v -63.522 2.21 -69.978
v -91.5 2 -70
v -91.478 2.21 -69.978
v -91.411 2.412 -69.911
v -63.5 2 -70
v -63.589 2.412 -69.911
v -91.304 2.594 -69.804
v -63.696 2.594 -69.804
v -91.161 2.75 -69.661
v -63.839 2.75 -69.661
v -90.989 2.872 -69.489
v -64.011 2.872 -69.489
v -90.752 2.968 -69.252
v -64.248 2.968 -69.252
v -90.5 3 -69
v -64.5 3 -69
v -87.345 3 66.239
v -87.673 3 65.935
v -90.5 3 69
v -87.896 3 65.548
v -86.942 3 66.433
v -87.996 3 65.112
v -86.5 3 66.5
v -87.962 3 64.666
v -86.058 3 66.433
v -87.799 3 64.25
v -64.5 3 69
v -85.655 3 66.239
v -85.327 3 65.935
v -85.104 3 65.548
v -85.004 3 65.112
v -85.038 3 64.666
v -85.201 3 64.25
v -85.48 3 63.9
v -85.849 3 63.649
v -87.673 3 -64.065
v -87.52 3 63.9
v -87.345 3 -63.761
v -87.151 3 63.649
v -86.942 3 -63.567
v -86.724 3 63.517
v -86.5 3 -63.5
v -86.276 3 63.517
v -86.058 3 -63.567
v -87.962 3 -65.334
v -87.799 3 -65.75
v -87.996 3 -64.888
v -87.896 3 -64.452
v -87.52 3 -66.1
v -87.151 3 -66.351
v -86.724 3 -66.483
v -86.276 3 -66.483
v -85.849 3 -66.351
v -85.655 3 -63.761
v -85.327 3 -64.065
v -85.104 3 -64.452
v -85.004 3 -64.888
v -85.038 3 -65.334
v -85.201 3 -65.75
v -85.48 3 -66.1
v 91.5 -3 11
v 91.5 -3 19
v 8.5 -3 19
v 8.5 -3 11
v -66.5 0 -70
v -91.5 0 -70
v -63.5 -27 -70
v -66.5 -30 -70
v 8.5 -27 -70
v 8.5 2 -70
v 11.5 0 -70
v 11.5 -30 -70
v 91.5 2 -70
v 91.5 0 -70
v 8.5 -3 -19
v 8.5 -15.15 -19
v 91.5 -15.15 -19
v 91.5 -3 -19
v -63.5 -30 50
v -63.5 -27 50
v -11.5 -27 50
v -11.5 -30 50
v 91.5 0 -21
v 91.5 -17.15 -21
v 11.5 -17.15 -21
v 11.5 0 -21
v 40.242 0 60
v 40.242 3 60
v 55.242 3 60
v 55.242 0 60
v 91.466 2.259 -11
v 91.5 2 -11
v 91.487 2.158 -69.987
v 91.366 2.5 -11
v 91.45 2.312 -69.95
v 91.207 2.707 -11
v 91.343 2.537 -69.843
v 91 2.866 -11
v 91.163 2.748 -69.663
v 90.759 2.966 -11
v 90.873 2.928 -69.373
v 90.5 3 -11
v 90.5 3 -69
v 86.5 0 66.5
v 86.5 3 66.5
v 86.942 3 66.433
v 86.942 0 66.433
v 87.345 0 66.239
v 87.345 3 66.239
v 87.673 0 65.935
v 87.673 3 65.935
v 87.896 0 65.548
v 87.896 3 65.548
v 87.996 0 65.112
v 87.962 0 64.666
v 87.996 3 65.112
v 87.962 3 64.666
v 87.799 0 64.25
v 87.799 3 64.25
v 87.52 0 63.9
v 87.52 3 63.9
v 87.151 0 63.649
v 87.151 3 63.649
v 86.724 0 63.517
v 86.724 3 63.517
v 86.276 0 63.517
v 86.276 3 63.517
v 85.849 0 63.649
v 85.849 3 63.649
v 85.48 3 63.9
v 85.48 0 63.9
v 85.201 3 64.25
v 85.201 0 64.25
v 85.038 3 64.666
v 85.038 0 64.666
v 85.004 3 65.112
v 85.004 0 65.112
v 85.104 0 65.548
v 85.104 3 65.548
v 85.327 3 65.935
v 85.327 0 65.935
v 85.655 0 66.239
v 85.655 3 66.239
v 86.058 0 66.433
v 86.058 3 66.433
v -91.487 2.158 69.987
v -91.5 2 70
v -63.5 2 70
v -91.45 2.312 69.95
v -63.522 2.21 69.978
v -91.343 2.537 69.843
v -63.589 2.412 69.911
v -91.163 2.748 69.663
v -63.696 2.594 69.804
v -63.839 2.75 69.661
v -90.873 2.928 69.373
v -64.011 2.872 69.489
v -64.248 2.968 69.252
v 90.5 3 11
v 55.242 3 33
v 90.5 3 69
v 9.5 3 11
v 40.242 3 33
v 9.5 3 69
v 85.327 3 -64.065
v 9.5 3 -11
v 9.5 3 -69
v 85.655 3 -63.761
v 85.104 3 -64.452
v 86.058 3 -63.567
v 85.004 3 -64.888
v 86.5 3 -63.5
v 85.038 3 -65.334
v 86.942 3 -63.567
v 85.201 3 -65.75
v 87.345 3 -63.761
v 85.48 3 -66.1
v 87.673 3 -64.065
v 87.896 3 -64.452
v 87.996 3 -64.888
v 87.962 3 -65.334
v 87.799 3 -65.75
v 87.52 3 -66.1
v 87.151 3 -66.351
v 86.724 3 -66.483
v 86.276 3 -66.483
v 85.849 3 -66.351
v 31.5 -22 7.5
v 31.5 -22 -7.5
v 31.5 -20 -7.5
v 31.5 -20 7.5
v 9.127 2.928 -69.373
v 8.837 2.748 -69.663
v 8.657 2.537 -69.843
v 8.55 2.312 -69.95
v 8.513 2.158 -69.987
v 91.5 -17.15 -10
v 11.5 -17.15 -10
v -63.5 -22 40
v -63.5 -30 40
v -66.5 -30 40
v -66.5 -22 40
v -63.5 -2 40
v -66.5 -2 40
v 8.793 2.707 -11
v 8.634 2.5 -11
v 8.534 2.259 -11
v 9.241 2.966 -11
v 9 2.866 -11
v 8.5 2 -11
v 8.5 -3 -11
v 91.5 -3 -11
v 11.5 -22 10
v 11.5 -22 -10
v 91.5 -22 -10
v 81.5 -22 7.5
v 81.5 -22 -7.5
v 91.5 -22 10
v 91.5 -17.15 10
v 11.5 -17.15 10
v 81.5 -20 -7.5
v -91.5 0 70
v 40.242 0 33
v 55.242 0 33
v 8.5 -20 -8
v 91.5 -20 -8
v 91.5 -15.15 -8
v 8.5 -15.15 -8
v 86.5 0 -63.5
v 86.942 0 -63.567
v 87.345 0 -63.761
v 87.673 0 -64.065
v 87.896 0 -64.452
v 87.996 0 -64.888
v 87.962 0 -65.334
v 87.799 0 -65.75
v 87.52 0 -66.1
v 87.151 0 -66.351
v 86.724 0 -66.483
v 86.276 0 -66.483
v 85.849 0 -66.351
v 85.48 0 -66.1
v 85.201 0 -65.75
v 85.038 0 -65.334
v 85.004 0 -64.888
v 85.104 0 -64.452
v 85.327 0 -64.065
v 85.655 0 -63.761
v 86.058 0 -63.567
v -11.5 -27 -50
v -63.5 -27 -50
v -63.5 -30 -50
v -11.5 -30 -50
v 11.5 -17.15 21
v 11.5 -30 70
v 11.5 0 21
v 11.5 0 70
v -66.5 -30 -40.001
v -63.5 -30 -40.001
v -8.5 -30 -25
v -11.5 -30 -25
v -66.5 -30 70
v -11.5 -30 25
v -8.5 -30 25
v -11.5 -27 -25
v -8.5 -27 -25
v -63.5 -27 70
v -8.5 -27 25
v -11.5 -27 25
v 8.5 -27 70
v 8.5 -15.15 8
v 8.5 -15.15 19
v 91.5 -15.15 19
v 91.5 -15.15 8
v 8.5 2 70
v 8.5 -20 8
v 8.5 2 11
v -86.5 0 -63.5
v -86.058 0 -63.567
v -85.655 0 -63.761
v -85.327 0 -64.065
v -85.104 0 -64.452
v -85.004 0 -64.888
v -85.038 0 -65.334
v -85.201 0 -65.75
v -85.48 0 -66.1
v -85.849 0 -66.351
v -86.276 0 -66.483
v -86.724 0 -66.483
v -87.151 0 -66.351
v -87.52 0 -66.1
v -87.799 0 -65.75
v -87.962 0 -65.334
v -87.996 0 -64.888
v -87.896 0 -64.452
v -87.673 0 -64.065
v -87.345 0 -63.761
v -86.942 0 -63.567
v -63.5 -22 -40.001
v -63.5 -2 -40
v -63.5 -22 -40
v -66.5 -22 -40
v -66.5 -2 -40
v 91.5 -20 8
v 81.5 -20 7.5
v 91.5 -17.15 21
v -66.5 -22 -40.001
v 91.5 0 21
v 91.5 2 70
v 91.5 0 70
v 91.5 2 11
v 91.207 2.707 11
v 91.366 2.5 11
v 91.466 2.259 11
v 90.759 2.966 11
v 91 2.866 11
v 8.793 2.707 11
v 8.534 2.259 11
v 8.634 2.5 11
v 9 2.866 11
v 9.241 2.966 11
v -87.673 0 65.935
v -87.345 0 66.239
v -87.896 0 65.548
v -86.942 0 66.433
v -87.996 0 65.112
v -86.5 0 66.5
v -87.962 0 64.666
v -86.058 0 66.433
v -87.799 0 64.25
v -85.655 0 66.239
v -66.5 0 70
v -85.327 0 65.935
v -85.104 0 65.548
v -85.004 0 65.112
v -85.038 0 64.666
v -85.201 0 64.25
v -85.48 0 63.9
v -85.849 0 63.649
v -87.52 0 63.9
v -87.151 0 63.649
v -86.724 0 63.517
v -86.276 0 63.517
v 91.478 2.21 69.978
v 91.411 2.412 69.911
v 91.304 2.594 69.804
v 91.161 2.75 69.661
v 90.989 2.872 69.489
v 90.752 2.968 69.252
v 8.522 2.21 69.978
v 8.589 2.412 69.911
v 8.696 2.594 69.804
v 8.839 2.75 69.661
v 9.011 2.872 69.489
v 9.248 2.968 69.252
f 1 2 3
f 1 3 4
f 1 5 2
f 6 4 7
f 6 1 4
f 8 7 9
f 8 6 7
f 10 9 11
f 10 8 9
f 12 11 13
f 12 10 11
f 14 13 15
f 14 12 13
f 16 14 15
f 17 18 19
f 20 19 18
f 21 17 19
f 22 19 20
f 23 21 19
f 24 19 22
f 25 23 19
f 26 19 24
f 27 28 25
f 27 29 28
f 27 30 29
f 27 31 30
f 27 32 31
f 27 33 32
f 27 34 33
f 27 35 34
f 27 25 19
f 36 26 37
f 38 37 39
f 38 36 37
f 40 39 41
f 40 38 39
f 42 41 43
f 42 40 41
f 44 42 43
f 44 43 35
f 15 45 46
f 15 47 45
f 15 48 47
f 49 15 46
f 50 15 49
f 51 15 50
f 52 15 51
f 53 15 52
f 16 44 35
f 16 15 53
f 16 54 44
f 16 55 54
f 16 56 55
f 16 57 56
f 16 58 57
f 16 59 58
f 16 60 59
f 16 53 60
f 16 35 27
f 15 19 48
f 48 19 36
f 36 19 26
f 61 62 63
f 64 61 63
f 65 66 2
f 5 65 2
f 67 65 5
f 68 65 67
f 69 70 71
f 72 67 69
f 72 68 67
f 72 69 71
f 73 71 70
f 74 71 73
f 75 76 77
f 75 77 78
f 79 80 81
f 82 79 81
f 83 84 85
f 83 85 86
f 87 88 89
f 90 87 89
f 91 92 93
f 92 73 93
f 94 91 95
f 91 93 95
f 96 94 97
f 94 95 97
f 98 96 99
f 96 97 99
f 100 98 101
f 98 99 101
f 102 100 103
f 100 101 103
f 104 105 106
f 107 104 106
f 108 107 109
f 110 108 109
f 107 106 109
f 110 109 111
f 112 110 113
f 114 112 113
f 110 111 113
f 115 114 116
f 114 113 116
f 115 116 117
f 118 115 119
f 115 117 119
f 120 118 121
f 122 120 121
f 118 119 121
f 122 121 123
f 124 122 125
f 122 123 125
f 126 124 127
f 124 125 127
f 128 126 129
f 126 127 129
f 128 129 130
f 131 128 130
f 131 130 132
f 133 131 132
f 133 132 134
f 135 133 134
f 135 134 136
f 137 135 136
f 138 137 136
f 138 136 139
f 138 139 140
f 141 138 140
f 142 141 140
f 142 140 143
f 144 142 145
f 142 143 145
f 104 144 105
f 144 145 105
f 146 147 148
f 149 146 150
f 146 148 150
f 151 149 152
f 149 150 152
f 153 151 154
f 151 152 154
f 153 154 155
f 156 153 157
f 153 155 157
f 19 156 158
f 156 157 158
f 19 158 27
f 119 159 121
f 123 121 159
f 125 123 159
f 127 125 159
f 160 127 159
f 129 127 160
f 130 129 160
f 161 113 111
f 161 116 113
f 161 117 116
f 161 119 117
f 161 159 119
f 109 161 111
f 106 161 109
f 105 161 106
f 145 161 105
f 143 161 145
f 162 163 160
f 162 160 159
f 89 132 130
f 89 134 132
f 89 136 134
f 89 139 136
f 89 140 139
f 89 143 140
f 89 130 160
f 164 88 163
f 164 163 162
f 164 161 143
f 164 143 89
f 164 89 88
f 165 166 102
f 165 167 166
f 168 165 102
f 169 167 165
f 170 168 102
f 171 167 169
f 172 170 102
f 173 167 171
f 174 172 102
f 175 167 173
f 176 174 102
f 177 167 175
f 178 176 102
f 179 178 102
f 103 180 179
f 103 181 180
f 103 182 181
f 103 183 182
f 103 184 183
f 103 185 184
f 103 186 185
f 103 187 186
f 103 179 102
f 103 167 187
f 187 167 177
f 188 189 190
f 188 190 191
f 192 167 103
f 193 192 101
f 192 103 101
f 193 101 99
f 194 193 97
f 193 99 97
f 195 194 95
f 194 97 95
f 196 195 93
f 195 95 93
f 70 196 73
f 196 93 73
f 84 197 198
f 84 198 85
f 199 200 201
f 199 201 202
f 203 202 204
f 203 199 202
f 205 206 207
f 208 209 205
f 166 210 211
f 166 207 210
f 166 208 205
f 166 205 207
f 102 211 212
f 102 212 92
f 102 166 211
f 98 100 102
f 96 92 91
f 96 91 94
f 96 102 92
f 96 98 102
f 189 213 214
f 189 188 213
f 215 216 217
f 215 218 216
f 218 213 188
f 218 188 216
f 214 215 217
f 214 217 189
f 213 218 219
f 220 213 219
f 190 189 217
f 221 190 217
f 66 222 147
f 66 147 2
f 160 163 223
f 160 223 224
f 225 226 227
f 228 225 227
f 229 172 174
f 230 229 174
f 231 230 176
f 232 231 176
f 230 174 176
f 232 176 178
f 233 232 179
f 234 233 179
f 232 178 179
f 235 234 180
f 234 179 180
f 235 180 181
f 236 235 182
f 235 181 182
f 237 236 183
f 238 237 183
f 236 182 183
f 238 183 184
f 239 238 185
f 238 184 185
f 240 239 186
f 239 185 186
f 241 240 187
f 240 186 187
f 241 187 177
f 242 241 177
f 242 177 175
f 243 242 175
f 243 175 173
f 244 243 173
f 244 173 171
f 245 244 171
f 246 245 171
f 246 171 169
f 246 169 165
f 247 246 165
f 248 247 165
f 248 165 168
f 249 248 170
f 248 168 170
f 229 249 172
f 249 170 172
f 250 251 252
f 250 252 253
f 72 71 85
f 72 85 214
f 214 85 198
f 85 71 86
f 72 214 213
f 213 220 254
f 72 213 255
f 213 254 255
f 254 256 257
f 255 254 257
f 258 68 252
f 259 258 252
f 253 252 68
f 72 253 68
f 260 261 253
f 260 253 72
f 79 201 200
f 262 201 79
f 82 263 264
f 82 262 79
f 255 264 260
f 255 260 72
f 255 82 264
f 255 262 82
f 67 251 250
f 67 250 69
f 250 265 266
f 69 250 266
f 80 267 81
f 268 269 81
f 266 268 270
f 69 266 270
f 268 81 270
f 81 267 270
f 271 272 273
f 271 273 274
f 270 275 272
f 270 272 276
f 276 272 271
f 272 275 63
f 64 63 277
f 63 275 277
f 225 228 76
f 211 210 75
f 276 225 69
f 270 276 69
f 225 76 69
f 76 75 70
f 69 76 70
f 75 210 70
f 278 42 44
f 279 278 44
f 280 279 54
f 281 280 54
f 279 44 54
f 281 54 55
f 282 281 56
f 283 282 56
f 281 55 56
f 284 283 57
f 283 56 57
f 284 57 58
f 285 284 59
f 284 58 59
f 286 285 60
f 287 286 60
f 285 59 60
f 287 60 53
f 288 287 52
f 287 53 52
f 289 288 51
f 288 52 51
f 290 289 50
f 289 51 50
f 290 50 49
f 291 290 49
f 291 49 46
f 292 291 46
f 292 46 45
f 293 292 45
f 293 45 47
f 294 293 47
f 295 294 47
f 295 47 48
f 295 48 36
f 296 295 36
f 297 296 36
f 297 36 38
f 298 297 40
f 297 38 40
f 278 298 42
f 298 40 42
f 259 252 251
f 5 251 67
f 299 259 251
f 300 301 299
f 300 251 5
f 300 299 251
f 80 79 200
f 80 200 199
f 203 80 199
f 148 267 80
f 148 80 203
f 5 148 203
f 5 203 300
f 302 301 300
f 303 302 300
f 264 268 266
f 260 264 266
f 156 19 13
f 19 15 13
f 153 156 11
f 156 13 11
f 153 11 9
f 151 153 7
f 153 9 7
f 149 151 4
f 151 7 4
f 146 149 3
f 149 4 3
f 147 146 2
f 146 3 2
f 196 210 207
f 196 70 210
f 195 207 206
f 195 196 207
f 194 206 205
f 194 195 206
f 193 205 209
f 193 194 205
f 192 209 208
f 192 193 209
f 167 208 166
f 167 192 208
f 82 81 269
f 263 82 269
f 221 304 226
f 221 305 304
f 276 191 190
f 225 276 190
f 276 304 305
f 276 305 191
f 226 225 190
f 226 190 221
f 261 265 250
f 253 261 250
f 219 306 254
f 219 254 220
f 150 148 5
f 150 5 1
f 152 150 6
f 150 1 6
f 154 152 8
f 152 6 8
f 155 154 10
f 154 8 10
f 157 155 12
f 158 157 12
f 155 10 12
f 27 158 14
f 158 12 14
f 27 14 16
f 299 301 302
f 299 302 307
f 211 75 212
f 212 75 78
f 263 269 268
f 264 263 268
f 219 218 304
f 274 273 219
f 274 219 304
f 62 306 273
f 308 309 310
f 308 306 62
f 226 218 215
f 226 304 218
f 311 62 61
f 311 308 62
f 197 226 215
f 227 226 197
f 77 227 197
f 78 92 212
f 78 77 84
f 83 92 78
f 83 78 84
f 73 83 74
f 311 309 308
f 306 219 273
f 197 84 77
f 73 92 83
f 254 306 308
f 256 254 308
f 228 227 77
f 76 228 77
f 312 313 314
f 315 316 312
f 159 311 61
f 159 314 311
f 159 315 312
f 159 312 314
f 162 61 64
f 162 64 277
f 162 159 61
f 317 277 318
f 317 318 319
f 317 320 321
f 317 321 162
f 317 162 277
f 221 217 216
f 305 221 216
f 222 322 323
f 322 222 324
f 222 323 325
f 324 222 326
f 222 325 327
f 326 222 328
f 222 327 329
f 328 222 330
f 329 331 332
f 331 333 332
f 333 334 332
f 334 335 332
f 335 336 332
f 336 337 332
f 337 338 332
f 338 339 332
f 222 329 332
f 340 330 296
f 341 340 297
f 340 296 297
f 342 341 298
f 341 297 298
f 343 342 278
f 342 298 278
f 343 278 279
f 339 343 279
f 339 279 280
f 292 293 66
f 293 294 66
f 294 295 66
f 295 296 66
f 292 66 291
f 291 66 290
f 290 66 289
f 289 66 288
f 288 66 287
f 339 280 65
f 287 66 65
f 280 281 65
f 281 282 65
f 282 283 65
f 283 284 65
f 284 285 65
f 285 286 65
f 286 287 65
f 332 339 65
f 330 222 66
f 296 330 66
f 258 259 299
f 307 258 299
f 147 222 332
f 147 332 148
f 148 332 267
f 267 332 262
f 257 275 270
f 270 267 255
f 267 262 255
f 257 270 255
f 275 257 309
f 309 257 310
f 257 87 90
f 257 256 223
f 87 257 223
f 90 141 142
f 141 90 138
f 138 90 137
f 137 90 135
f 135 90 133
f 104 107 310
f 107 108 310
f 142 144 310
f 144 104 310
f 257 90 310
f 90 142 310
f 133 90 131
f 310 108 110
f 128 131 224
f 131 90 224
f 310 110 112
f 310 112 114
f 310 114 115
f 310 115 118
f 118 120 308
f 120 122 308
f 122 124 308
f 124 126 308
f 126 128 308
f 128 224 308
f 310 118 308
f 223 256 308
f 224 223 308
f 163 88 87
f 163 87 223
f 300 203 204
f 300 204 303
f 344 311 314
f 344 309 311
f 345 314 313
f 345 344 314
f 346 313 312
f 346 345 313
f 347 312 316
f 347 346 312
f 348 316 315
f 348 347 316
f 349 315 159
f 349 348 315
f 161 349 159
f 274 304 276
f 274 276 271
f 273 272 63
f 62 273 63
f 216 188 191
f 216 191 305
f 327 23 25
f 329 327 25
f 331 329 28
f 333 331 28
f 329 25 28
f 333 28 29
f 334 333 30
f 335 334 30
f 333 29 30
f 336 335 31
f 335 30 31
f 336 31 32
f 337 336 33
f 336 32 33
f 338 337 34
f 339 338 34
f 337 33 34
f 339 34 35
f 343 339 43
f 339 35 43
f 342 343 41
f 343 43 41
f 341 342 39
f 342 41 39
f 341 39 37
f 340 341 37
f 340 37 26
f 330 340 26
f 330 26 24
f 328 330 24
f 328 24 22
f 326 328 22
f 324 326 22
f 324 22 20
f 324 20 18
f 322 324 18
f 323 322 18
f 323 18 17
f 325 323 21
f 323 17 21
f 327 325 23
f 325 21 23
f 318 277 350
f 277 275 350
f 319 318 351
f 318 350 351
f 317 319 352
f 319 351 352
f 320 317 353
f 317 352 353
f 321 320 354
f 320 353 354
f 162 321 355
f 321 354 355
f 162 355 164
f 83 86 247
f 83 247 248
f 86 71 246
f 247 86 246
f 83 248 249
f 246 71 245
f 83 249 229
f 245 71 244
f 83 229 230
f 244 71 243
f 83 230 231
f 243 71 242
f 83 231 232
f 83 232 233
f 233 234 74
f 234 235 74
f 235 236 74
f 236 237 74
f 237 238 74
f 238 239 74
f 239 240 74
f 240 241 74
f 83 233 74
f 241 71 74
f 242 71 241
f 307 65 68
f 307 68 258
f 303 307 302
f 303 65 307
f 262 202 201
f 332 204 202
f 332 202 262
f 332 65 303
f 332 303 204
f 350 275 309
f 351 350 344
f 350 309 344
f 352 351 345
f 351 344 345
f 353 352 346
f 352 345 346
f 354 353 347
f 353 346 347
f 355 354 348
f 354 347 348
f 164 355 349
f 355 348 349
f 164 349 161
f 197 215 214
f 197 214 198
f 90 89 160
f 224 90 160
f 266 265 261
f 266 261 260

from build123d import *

# Parameters (mm, degrees)
SKETCH1_W               = 183
SKETCH1_H               = 140
BOSS_EXTRUDE1_DEPTH     = 3
SKETCH2_W               = 78
SKETCH2_H               = 140
BOSS_EXTRUDE2_DEPTH     = 30
SKETCH3_W               = 72
SKETCH3_H               = 30
CUT_EXTRUDE1_DEPTH      = 140
SKETCH5_W               = 80
SKETCH5_H               = 70
BOSS_EXTRUDE3_DEPTH     = 25
CUT_EXTRUDE2_DEPTH      = 199.214530244
CUT_EXTRUDE2_DEPTH_BACK = 85
SKETCH7_W               = 20
SKETCH7_H               = 30
CUT_EXTRUDE3_DEPTH      = 85
SKETCH8_W               = 60
SKETCH8_H               = 20
CUT_EXTRUDE4_DEPTH      = 85
SKETCH9_W               = 50
SKETCH9_H               = 15
CUT_EXTRUDE5_DEPTH      = 10
SKETCH11_W              = 20
SKETCH11_H              = 20
CUT_EXTRUDE6_DEPTH      = 10
SKETCH12_W              = 20
SKETCH12_H              = 20
CUT_EXTRUDE7_DEPTH      = 10
SKETCH15_W              = 42
SKETCH15_H              = 100
CUT_EXTRUDE8_DEPTH      = 10
SKETCH16_W              = 13.088467217
SKETCH16_H              = 23
BOSS_EXTRUDE4_DEPTH     = 83
SKETCH17_W              = 13.301151585
SKETCH17_H              = 23.738473688
BOSS_EXTRUDE5_DEPTH     = 83
SKETCH18_W              = 83
SKETCH18_H              = 6
BOSS_EXTRUDE6_DEPTH     = 8
SKETCH19_W              = 83
SKETCH19_H              = 6
BOSS_EXTRUDE7_DEPTH     = 8
SKETCH20_W              = 14
SKETCH20_H              = 25
CUT_EXTRUDE9_DEPTH      = 80
SKETCH21_W              = 14
SKETCH21_H              = 25
CUT_EXTRUDE10_DEPTH     = 80
SKETCH22_W              = 42
SKETCH22_H              = 3
CUT_EXTRUDE11_DEPTH     = 80
SKETCH23_W              = 10
SKETCH23_H              = 100
CUT_EXTRUDE12_DEPTH     = 3
SKETCH24_W              = 80.000727439
SKETCH24_H              = 8
CUT_EXTRUDE13_DEPTH     = 3
SKETCH25_W              = 11
SKETCH25_H              = 4.85
BOSS_EXTRUDE9_DEPTH     = 83
SKETCH26_W              = 11
SKETCH26_H              = 4.85
BOSS_EXTRUDE10_DEPTH    = 83
SKETCH27_W              = 11
SKETCH27_H              = 4.85
CUT_EXTRUDE14_DEPTH     = 80
SKETCH28_W              = 11
SKETCH28_H              = 4.85
CUT_EXTRUDE15_DEPTH     = 80
SKETCH29_W              = 15
SKETCH29_H              = 27
CUT_EXTRUDE16_DEPTH     = 12
FILLET2_R               = 1
SKETCH30_R              = 1.5
CUT_EXTRUDE17_DEPTH     = 3
SKETCH31_R              = 1.5
CUT_EXTRUDE18_DEPTH     = 3
SKETCH32_R              = 1.5
CUT_EXTRUDE19_DEPTH     = 3
SKETCH33_R              = 1.5
CUT_EXTRUDE20_DEPTH     = 3


with BuildPart() as part:
    # Sketch1 → Boss-Extrude1 (new body)
    with BuildSketch(Plane(origin=(0, 0, 0), x_dir=(1, 0, 0), z_dir=(0, 1, 0))):
        Rectangle(SKETCH1_W, SKETCH1_H)
    extrude(amount=BOSS_EXTRUDE1_DEPTH)

    # Sketch2 → Boss-Extrude2 (add)
    with BuildSketch(Plane.XZ):
        with Locations((-27.5, 0)):
            Rectangle(SKETCH2_W, SKETCH2_H)
    extrude(amount=BOSS_EXTRUDE2_DEPTH)

    # Sketch3 → Cut-Extrude1 (cut)
    with BuildSketch(Plane.XY.offset(70)):
        with Locations((-27.5, -12)):
            Rectangle(SKETCH3_W, SKETCH3_H)
    extrude(amount=-CUT_EXTRUDE1_DEPTH, mode=Mode.SUBTRACT)

    # Sketch5 → Boss-Extrude3 (add)
    with BuildSketch(Plane.XZ):
        with Locations((51.5, 0)):
            Rectangle(SKETCH5_W, SKETCH5_H)
    extrude(amount=BOSS_EXTRUDE3_DEPTH)

    # Sketch6 → Cut-Extrude2 (cut, two sides: drawn at the far end of the back side and taken through both)
    with BuildSketch(Plane(origin=(91.5, 0, 0), x_dir=(0, 0, -1), z_dir=(1, 0, 0)).offset(-CUT_EXTRUDE2_DEPTH_BACK)):
        Polygon((-20, 204.718543704), (-20, 3), (-20, -4.67262363), (-30, -4.67262363), (-30, -20), (30, -20), (30, -4.67262363), (20, -4.67262363), (20, 3), (20, 204.718543704), (20, 608.155631112), (-20, 608.155631112), align=None)
    extrude(amount=CUT_EXTRUDE2_DEPTH + CUT_EXTRUDE2_DEPTH_BACK, mode=Mode.SUBTRACT)

    # Sketch7 → Cut-Extrude3 (cut)
    with BuildSketch(Plane(origin=(0, -27, 0), x_dir=(1, 0, 0), z_dir=(0, 1, 0))):
        with Locations((-18.5, 10)):
            Rectangle(SKETCH7_W, SKETCH7_H)
    extrude(amount=-CUT_EXTRUDE3_DEPTH, mode=Mode.SUBTRACT)

    # Sketch8 → Cut-Extrude4 (cut)
    with BuildSketch(Plane(origin=(-63.5, 0, 0), x_dir=(0, 0, -1), z_dir=(1, 0, 0))):
        with Locations((10, -12)):
            Rectangle(SKETCH8_W, SKETCH8_H)
    extrude(amount=-CUT_EXTRUDE4_DEPTH, mode=Mode.SUBTRACT)

    # Sketch9 → Cut-Extrude5 (cut)
    with BuildSketch(Plane.XZ.offset(25)):
        with Locations((56.5, 0)):
            Rectangle(SKETCH9_W, SKETCH9_H)
    extrude(amount=-CUT_EXTRUDE5_DEPTH, mode=Mode.SUBTRACT)

    # Sketch11 → Cut-Extrude6 (cut)
    with BuildSketch(Plane(origin=(-63.5, 0, 0), x_dir=(0, 0, -1), z_dir=(1, 0, 0))):
        with Locations((-30, -12)):
            Rectangle(SKETCH11_W, SKETCH11_H)
    extrude(amount=-CUT_EXTRUDE6_DEPTH, mode=Mode.SUBTRACT)

    # Sketch12 → Cut-Extrude7 (cut)
    with BuildSketch(Plane(origin=(0, -27, 0), x_dir=(1, 0, 0), z_dir=(0, 1, 0))):
        with Locations((-18.5, -15)):
            Rectangle(SKETCH12_W, SKETCH12_H)
    extrude(amount=-CUT_EXTRUDE7_DEPTH, mode=Mode.SUBTRACT)

    # Sketch15 → Cut-Extrude8 (cut)
    with BuildSketch(Plane(origin=(0, -27, 0), x_dir=(1, 0, 0), z_dir=(0, 1, 0))):
        with Locations((-32.5, 0)):
            Rectangle(SKETCH15_W, SKETCH15_H)
    extrude(amount=-CUT_EXTRUDE8_DEPTH, mode=Mode.SUBTRACT)

    # Sketch16 → Boss-Extrude4 (add)
    with BuildSketch(Plane(origin=(91.5, 0, 0), x_dir=(0, 0, -1), z_dir=(1, 0, 0))):
        with Locations((-25.544233609, -8.5)):
            Rectangle(SKETCH16_W, SKETCH16_H)
    extrude(amount=-BOSS_EXTRUDE4_DEPTH)

    # Sketch17 → Boss-Extrude5 (add)
    with BuildSketch(Plane(origin=(91.5, 0, 0), x_dir=(0, 0, -1), z_dir=(1, 0, 0))):
        with Locations((25.650575792, -8.869236844)):
            Rectangle(SKETCH17_W, SKETCH17_H)
    extrude(amount=-BOSS_EXTRUDE5_DEPTH)

    # Sketch18 → Boss-Extrude6 (add)
    with BuildSketch(Plane(origin=(0, 0, 19), x_dir=(-1, 0, 0), z_dir=(0, 0, -1))):
        with Locations((-50, 0)):
            Rectangle(SKETCH18_W, SKETCH18_H)
    extrude(amount=BOSS_EXTRUDE6_DEPTH)

    # Sketch19 → Boss-Extrude7 (add)
    with BuildSketch(Plane.XY.offset(-19)):
        with Locations((50, 0)):
            Rectangle(SKETCH19_W, SKETCH19_H)
    extrude(amount=BOSS_EXTRUDE7_DEPTH)

    # Sketch20 → Cut-Extrude9 (cut)
    with BuildSketch(Plane(origin=(91.5, 0, 0), x_dir=(0, 0, -1), z_dir=(1, 0, 0))):
        with Locations((-28, -12.5)):
            Rectangle(SKETCH20_W, SKETCH20_H)
    extrude(amount=-CUT_EXTRUDE9_DEPTH, mode=Mode.SUBTRACT)

    # Sketch21 → Cut-Extrude10 (cut)
    with BuildSketch(Plane(origin=(91.5, 0, 0), x_dir=(0, 0, -1), z_dir=(1, 0, 0))):
        with Locations((28, -12.5)):
            Rectangle(SKETCH21_W, SKETCH21_H)
    extrude(amount=-CUT_EXTRUDE10_DEPTH, mode=Mode.SUBTRACT)

    # Sketch22 → Cut-Extrude11 (cut)
    with BuildSketch(Plane(origin=(91.5, 0, 0), x_dir=(0, 0, -1), z_dir=(1, 0, 0))):
        with Locations((0, -23.5)):
            Rectangle(SKETCH22_W, SKETCH22_H)
    extrude(amount=-CUT_EXTRUDE11_DEPTH, mode=Mode.SUBTRACT)

    # Sketch23 → Cut-Extrude12 (cut)
    with BuildSketch(Plane(origin=(0, -27, 0), x_dir=(1, 0, 0), z_dir=(0, 1, 0))):
        with Locations((-58.5, 0)):
            Rectangle(SKETCH23_W, SKETCH23_H)
    extrude(amount=-CUT_EXTRUDE12_DEPTH, mode=Mode.SUBTRACT)

    # Sketch24 → Cut-Extrude13 (cut)
    with BuildSketch(Plane(origin=(-63.5, 0, 0), x_dir=(0, 0, -1), z_dir=(1, 0, 0))):
        with Locations((0.00036372, -26)):
            Rectangle(SKETCH24_W, SKETCH24_H)
    extrude(amount=-CUT_EXTRUDE13_DEPTH, mode=Mode.SUBTRACT)

    # Sketch25 → Boss-Extrude9 (add)
    with BuildSketch(Plane(origin=(91.5, 0, 0), x_dir=(0, 0, -1), z_dir=(1, 0, 0))):
        with Locations((-13.5, -17.575)):
            Rectangle(SKETCH25_W, SKETCH25_H)
    extrude(amount=-BOSS_EXTRUDE9_DEPTH)

    # Sketch26 → Boss-Extrude10 (add)
    with BuildSketch(Plane(origin=(91.5, 0, 0), x_dir=(0, 0, -1), z_dir=(1, 0, 0))):
        with Locations((13.5, -17.575)):
            Rectangle(SKETCH26_W, SKETCH26_H)
    extrude(amount=-BOSS_EXTRUDE10_DEPTH)

    # Sketch27 → Cut-Extrude14 (cut)
    with BuildSketch(Plane(origin=(91.5, 0, 0), x_dir=(0, 0, -1), z_dir=(1, 0, 0))):
        with Locations((-15.5, -19.575)):
            Rectangle(SKETCH27_W, SKETCH27_H)
    extrude(amount=-CUT_EXTRUDE14_DEPTH, mode=Mode.SUBTRACT)

    # Sketch28 → Cut-Extrude15 (cut)
    with BuildSketch(Plane(origin=(91.5, 0, 0), x_dir=(0, 0, -1), z_dir=(1, 0, 0))):
        with Locations((15.5, -19.575)):
            Rectangle(SKETCH28_W, SKETCH28_H)
    extrude(amount=-CUT_EXTRUDE15_DEPTH, mode=Mode.SUBTRACT)

    # Sketch29 → Cut-Extrude16 (cut)
    with BuildSketch(Plane(origin=(0, 3, 0), x_dir=(1, 0, 0), z_dir=(0, 1, 0))):
        with Locations((47.741795072, -46.5)):
            Rectangle(SKETCH29_W, SKETCH29_H)
    extrude(amount=-CUT_EXTRUDE16_DEPTH, mode=Mode.SUBTRACT)

    # Fillet2
    fillet2_edges = [part.edges().sort_by_distance(p)[0] for p in [
        (91.5, 3, 40.5),
        (50, 3, -70),
        (50, 3, 70),
        (-77.5, 3, -70),
        (-63.5, 3, 0),
        (8.5, 3, -40.5),
        (-91.5, 3, 0),
        (8.5, 3, 40.5),
        (91.5, 3, -40.5),
        (-77.5, 3, 70),
    ]]
    fillet(fillet2_edges, radius=FILLET2_R)

    # Sketch30 → Cut-Extrude17 (cut)
    with BuildSketch(Plane(origin=(0, 3, 0), x_dir=(1, 0, 0), z_dir=(0, 1, 0))):
        with Locations(Location((-86.5, -65, 0), (0, 0, 270))):
            Circle(SKETCH30_R)
    extrude(amount=-CUT_EXTRUDE17_DEPTH, mode=Mode.SUBTRACT)

    # Sketch31 → Cut-Extrude18 (cut)
    with BuildSketch(Plane(origin=(0, 3, 0), x_dir=(1, 0, 0), z_dir=(0, 1, 0))):
        with Locations(Location((-86.5, 65, 0), (0, 0, 270))):
            Circle(SKETCH31_R)
    extrude(amount=-CUT_EXTRUDE18_DEPTH, mode=Mode.SUBTRACT)

    # Sketch32 → Cut-Extrude19 (cut)
    with BuildSketch(Plane(origin=(0, 3, 0), x_dir=(1, 0, 0), z_dir=(0, 1, 0))):
        with Locations(Location((86.5, 65, 0), (0, 0, 270))):
            Circle(SKETCH32_R)
    extrude(amount=-CUT_EXTRUDE19_DEPTH, mode=Mode.SUBTRACT)

    # Sketch33 → Cut-Extrude20 (cut)
    with BuildSketch(Plane(origin=(0, 3, 0), x_dir=(1, 0, 0), z_dir=(0, 1, 0))):
        with Locations(Location((86.5, -65, 0), (0, 0, 270))):
            Circle(SKETCH33_R)
    extrude(amount=-CUT_EXTRUDE20_DEPTH, mode=Mode.SUBTRACT)


solid = part.part
